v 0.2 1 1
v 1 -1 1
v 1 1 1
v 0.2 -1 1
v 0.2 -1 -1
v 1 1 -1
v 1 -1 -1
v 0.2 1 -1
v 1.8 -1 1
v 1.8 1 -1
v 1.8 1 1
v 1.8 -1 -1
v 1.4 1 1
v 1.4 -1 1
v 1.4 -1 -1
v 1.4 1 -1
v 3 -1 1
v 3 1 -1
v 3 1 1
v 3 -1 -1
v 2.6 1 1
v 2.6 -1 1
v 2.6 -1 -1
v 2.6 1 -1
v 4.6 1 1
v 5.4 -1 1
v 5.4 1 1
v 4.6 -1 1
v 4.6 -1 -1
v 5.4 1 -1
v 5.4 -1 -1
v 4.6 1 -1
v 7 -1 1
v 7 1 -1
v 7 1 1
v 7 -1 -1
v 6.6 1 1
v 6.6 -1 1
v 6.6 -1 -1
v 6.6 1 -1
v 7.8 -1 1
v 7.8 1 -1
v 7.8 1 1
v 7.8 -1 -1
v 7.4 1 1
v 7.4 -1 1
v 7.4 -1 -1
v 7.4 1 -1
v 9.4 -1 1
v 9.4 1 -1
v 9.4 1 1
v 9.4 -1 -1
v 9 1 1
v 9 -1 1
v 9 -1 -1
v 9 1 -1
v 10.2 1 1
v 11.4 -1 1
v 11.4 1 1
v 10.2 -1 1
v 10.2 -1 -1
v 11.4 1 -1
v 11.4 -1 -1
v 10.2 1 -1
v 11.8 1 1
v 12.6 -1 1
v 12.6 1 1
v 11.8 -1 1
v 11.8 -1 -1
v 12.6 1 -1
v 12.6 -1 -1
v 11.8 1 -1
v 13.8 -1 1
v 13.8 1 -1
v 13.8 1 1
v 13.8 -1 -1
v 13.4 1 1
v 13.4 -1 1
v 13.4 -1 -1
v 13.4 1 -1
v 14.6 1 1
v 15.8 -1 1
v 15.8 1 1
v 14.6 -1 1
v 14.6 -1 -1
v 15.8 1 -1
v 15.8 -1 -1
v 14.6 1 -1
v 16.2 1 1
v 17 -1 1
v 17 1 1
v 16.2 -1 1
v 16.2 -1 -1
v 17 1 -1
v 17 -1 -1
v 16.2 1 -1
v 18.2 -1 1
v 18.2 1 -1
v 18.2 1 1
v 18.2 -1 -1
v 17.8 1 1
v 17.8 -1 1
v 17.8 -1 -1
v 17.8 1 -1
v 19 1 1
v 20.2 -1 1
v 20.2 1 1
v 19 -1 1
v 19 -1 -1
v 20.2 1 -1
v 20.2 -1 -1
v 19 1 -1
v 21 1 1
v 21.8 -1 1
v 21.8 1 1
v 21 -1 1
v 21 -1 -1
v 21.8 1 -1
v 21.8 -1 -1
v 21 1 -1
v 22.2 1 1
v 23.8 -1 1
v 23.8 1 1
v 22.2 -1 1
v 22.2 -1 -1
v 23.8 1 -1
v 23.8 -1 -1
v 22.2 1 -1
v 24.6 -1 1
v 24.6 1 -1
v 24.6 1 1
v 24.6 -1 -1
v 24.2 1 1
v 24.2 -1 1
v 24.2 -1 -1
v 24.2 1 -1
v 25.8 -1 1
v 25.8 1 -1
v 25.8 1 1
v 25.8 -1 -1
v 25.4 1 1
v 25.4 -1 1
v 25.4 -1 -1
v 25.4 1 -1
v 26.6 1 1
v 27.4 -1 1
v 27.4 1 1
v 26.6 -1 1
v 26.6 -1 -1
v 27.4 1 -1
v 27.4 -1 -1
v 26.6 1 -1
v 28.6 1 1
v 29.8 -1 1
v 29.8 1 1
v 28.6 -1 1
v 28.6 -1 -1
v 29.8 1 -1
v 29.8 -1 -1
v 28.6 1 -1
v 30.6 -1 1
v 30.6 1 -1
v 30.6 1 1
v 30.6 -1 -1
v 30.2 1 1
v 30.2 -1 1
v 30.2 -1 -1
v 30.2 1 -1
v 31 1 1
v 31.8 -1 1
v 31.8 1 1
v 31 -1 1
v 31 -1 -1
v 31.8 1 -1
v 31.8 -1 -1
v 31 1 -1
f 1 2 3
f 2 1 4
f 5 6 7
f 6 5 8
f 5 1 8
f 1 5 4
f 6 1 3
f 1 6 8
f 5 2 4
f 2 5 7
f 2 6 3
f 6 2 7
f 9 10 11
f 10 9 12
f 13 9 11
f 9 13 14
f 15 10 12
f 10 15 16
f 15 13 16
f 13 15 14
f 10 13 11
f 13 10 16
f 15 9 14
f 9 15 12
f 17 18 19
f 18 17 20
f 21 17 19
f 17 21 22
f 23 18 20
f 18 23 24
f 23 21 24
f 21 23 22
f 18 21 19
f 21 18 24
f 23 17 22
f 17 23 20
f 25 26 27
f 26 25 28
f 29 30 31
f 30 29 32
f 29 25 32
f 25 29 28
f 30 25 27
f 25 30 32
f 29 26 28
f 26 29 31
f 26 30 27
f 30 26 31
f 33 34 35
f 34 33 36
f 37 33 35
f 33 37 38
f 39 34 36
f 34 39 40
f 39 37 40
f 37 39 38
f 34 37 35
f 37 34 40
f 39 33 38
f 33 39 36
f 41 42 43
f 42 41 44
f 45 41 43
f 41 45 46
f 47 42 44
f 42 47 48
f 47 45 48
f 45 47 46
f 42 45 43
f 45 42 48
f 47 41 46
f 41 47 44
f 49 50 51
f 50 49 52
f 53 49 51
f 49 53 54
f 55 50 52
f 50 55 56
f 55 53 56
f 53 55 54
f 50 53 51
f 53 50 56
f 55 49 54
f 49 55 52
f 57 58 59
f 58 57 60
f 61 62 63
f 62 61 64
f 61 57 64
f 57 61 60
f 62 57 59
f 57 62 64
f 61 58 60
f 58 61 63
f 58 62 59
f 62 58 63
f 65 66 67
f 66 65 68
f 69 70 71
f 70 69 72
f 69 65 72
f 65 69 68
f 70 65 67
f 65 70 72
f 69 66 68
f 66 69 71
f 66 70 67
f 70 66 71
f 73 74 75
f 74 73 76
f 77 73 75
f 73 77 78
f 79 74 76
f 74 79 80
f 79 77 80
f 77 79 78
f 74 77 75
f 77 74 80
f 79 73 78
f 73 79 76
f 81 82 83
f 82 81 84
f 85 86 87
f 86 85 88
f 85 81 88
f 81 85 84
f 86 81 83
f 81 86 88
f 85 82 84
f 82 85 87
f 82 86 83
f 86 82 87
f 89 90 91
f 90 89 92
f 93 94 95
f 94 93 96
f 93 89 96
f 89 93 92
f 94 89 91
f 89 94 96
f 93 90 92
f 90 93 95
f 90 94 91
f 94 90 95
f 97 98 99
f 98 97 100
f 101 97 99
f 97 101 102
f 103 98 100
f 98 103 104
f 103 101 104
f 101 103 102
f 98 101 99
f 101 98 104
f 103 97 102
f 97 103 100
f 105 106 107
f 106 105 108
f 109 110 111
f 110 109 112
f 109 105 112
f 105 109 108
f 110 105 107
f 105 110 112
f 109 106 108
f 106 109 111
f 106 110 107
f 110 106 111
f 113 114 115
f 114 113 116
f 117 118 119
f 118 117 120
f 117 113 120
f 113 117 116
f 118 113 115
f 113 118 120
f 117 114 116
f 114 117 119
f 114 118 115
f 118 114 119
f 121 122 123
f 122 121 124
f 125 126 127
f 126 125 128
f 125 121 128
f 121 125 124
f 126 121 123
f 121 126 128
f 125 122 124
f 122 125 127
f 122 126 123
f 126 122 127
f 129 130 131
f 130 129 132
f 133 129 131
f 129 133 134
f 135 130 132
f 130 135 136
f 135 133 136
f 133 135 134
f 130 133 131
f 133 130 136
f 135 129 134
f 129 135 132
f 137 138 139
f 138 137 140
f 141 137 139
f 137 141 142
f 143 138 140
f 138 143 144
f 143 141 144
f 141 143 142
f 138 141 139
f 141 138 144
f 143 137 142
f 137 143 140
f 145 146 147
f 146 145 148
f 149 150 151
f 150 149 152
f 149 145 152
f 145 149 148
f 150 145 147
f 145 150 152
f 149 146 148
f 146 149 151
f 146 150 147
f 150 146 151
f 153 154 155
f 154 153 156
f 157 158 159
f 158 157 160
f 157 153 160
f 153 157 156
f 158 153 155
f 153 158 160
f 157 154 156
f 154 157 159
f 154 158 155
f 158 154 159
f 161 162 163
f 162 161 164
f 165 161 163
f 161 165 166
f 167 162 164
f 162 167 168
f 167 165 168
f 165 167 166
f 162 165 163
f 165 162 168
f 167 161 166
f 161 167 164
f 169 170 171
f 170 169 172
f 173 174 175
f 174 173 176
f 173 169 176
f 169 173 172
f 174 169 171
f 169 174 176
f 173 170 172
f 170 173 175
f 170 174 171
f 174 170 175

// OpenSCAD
translate([0.4,0,0])  cube(size = [0.4,2,2], center=true);
translate([0.8,0,0])  cube(size = [0.4,2,2], center=true);
translate([1.6,0,0])  cube(size = [0.4,2,2], center=true);
translate([2.8,0,0])  cube(size = [0.4,2,2], center=true);
translate([4.8,0,0])  cube(size = [0.4,2,2], center=true);
translate([5.2,0,0])  cube(size = [0.4,2,2], center=true);
translate([6.8,0,0])  cube(size = [0.4,2,2], center=true);
translate([7.6,0,0])  cube(size = [0.4,2,2], center=true);
translate([9.2,0,0])  cube(size = [0.4,2,2], center=true);
translate([10.4,0,0])  cube(size = [0.4,2,2], center=true);
translate([10.8,0,0])  cube(size = [0.4,2,2], center=true);
translate([11.2,0,0])  cube(size = [0.4,2,2], center=true);
translate([12,0,0])  cube(size = [0.4,2,2], center=true);
translate([12.4,0,0])  cube(size = [0.4,2,2], center=true);
translate([13.6,0,0])  cube(size = [0.4,2,2], center=true);
translate([14.8,0,0])  cube(size = [0.4,2,2], center=true);
translate([15.2,0,0])  cube(size = [0.4,2,2], center=true);
translate([15.6,0,0])  cube(size = [0.4,2,2], center=true);
translate([16.4,0,0])  cube(size = [0.4,2,2], center=true);
translate([16.8,0,0])  cube(size = [0.4,2,2], center=true);
translate([18,0,0])  cube(size = [0.4,2,2], center=true);
translate([19.2,0,0])  cube(size = [0.4,2,2], center=true);
translate([19.6,0,0])  cube(size = [0.4,2,2], center=true);
translate([20,0,0])  cube(size = [0.4,2,2], center=true);
translate([21.2,0,0])  cube(size = [0.4,2,2], center=true);
translate([21.6,0,0])  cube(size = [0.4,2,2], center=true);
translate([22.4,0,0])  cube(size = [0.4,2,2], center=true);
translate([22.8,0,0])  cube(size = [0.4,2,2], center=true);
translate([23.2,0,0])  cube(size = [0.4,2,2], center=true);
translate([23.6,0,0])  cube(size = [0.4,2,2], center=true);
translate([24.4,0,0])  cube(size = [0.4,2,2], center=true);
translate([25.6,0,0])  cube(size = [0.4,2,2], center=true);
translate([26.8,0,0])  cube(size = [0.4,2,2], center=true);
translate([27.2,0,0])  cube(size = [0.4,2,2], center=true);
translate([28.8,0,0])  cube(size = [0.4,2,2], center=true);
translate([29.2,0,0])  cube(size = [0.4,2,2], center=true);
translate([29.6,0,0])  cube(size = [0.4,2,2], center=true);
translate([30.4,0,0])  cube(size = [0.4,2,2], center=true);
translate([31.2,0,0])  cube(size = [0.4,2,2], center=true);
translate([31.6,0,0])  cube(size = [0.4,2,2], center=true);
